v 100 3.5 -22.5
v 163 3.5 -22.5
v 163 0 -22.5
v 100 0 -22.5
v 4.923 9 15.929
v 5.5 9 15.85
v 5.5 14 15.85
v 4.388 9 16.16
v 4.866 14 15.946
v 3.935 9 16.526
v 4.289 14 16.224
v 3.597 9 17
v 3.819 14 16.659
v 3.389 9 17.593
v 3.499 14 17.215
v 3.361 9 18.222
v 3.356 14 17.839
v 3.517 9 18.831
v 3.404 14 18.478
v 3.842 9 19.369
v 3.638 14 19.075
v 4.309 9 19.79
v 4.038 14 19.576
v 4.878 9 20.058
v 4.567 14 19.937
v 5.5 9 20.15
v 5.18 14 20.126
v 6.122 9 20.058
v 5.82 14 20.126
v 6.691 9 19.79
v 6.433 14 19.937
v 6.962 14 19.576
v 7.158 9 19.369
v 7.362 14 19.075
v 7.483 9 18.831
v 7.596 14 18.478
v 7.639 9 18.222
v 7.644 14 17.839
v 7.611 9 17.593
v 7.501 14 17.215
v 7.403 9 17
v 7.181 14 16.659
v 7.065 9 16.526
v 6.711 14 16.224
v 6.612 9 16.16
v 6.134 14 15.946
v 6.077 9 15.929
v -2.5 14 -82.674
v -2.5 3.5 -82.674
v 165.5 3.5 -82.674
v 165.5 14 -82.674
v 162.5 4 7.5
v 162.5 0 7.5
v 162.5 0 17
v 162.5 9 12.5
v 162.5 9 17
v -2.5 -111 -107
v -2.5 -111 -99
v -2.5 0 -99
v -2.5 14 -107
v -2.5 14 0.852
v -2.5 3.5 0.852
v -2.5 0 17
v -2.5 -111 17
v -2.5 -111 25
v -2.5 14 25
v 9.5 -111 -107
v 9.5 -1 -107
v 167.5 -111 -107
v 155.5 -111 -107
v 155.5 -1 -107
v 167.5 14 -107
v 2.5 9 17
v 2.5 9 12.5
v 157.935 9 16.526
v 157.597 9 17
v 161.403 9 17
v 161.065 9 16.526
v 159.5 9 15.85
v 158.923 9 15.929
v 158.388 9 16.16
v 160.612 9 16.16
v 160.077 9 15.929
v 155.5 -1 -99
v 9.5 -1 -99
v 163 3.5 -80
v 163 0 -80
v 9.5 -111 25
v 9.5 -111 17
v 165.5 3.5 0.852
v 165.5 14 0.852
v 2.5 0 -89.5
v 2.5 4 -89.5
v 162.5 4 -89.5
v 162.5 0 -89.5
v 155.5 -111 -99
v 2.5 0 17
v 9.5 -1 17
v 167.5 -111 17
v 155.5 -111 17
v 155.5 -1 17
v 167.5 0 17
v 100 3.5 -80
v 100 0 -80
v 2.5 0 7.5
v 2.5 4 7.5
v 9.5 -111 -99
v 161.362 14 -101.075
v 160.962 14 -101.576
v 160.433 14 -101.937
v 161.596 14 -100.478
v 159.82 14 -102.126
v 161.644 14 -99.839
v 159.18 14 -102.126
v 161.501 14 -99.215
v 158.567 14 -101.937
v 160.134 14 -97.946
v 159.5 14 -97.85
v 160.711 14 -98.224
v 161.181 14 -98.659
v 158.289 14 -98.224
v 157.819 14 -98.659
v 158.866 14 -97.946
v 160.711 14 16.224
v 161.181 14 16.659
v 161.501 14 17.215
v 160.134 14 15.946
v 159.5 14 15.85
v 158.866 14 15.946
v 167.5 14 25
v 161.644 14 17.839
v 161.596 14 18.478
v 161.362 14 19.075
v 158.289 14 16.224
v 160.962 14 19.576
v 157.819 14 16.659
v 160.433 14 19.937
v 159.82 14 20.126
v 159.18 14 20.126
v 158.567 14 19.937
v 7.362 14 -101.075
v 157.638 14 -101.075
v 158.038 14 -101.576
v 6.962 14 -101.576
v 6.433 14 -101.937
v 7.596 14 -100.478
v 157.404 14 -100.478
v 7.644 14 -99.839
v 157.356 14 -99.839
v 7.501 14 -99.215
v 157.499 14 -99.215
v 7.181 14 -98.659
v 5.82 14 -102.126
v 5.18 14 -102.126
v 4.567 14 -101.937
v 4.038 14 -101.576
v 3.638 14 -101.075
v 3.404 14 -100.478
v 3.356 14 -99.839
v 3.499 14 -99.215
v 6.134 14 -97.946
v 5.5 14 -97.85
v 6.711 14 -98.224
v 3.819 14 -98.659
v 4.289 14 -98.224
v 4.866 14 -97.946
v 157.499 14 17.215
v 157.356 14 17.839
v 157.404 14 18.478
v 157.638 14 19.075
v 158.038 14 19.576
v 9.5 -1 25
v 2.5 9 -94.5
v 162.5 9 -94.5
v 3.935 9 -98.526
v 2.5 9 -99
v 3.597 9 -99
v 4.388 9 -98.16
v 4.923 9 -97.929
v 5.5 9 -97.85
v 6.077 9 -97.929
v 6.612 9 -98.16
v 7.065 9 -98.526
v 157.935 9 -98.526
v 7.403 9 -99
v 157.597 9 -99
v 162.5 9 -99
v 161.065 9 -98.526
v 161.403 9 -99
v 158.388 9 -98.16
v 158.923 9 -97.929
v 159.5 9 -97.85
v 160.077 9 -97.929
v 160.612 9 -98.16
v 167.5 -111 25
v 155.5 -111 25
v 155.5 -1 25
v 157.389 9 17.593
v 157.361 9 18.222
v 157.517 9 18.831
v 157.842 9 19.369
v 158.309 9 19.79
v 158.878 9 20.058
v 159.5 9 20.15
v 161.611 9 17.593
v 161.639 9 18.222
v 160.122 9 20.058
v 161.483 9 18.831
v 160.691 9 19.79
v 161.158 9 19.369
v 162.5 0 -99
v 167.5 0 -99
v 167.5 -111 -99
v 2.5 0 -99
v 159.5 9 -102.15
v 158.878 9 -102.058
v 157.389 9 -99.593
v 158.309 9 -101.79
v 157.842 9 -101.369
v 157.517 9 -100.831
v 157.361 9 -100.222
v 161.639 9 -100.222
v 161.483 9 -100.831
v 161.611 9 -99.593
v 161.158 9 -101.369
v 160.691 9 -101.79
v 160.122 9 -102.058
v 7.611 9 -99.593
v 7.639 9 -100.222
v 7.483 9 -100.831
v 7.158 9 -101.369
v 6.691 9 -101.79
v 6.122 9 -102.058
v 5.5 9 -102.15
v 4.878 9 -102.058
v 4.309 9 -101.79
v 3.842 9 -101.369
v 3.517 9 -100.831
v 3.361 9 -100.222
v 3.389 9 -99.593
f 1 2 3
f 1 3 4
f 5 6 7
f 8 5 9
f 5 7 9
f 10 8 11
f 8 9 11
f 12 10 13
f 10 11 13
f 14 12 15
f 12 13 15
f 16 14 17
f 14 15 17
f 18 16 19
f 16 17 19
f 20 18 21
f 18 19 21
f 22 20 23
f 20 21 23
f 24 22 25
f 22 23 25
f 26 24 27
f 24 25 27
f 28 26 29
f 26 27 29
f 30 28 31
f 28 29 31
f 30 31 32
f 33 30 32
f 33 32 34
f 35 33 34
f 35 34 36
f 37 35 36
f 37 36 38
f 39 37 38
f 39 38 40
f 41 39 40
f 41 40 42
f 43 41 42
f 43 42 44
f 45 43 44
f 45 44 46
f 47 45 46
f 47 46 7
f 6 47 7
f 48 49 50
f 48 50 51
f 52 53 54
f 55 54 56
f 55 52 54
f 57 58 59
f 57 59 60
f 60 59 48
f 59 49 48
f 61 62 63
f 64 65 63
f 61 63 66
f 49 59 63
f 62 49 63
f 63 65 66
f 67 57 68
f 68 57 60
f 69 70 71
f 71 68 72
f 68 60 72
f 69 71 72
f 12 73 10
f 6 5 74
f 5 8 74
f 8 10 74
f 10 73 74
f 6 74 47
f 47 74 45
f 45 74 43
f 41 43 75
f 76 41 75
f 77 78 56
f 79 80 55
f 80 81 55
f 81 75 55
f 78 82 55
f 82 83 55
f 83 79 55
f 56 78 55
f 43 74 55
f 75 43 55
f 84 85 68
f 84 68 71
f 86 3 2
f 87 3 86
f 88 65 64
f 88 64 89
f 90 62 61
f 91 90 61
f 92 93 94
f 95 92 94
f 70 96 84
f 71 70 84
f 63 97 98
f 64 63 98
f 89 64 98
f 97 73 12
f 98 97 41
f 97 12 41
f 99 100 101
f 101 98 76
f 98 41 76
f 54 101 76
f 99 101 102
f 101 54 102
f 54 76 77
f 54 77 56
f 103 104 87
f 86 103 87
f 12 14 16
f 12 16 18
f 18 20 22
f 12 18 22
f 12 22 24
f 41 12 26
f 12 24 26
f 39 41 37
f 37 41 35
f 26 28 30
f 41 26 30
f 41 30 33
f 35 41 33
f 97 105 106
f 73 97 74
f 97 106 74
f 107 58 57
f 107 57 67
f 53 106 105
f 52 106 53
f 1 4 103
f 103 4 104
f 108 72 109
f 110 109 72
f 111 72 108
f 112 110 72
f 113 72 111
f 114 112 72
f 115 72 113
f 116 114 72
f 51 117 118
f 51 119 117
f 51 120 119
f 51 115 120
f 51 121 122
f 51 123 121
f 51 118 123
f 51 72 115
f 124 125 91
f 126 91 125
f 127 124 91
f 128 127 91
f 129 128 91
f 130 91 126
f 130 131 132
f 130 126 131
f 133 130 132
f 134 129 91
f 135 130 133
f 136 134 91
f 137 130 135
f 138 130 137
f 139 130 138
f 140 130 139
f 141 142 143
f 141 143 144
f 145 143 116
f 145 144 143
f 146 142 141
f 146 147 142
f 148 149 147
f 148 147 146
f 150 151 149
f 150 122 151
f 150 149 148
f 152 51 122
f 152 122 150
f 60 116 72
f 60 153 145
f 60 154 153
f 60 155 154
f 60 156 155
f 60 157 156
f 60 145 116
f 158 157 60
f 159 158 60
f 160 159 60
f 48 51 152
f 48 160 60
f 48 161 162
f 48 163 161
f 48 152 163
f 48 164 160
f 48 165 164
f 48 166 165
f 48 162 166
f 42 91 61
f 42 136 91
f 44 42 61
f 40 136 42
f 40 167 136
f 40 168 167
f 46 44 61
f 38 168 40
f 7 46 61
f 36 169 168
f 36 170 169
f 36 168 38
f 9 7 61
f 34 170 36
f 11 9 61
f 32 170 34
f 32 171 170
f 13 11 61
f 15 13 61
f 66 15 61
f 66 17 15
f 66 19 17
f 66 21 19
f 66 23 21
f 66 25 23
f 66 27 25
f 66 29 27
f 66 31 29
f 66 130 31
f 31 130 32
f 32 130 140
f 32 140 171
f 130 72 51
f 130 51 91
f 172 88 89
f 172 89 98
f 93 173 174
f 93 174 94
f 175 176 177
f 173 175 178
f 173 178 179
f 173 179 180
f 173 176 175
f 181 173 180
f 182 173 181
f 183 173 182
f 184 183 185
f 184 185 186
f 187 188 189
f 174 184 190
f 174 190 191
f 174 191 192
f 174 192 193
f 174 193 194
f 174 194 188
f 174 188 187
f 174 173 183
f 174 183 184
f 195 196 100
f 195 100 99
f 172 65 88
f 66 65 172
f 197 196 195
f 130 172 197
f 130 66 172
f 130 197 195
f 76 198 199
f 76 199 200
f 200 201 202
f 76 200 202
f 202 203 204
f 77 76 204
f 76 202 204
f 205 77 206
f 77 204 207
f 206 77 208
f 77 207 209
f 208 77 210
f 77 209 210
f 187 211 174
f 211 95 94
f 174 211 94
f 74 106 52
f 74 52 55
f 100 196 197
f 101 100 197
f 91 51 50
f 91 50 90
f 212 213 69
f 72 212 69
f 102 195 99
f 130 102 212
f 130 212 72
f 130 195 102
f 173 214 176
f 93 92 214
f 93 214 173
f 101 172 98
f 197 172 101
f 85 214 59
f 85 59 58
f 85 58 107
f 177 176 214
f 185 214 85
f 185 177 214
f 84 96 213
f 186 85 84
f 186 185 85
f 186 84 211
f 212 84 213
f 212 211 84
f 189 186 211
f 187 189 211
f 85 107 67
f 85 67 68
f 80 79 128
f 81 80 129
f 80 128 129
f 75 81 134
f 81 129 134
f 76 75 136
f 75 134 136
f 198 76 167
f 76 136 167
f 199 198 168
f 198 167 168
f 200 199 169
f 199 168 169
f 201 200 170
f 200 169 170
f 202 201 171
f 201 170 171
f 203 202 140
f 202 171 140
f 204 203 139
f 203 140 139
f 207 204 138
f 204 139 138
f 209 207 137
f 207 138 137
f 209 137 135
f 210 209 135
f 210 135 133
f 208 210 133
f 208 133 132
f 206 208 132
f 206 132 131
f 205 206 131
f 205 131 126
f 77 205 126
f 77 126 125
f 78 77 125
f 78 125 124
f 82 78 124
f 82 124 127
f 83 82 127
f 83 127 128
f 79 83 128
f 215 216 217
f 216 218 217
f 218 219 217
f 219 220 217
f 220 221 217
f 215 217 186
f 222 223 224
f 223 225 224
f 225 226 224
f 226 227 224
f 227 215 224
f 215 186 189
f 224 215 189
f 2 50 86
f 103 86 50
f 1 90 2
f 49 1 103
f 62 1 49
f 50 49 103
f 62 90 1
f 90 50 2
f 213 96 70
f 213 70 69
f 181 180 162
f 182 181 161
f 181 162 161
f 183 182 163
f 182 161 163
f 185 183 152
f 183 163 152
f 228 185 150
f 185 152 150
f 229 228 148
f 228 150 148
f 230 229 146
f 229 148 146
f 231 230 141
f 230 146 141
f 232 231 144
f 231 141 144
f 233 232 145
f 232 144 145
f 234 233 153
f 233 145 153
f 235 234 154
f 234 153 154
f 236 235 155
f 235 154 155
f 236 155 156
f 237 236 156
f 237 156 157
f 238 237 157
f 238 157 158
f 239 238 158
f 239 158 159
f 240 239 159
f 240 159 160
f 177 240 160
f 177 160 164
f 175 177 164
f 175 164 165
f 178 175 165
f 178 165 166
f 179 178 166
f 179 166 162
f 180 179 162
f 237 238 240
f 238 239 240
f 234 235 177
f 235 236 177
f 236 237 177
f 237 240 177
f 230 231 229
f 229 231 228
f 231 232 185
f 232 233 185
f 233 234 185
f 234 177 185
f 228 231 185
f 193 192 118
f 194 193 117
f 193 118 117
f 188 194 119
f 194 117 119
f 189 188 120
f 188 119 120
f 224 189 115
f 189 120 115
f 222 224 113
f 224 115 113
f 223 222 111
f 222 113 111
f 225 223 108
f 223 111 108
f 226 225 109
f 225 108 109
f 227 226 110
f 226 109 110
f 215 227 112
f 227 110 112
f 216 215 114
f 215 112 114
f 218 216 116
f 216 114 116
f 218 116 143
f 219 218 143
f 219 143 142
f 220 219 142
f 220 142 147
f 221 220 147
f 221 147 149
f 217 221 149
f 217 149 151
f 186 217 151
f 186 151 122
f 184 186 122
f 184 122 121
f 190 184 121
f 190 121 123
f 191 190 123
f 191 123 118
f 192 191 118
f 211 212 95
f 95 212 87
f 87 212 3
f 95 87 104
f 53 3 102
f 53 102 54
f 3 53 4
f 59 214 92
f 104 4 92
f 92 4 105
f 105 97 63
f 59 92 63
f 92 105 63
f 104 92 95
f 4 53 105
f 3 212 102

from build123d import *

# Parameters (mm, degrees)
SKETCH1_9_W                                = 170
SKETCH1_9_H                                = 87
BOSS_EXTRUDE5_DEPTH                        = 2
SKETCH1_10_W                               = 63
SKETCH1_10_H                               = 78
CUT_EXTRUDE3_DEPTH                         = 9
SKETCH1_12_W                               = 170
SKETCH1_12_H                               = 87
BOSS_EXTRUDE6_DEPTH                        = 14
SKETCH1_W                                  = 63
SKETCH1_H                                  = 78
CUT_EXTRUDE4_DEPTH                         = 29
SKETCH8_W                                  = 83.526029731
SKETCH8_H                                  = 10.5
CUT_EXTRUDE5_DEPTH                         = 168
BOSS_EXTRUDE10_DEPTH                       = 22.5
CHAMFER1_SIZE                              = 10
CHAMFER2_SIZE                              = 10
SKETCH47_R                                 = 2.15
CUT_EXTRUDE10_DEPTH                        = 9.5
SKETCH37_W                                 = 170
SKETCH37_H                                 = 9
BOSS_EXTRUDE20_DEPTH                       = 5
SKETCH25_W                                 = 170
SKETCH25_H                                 = 8
BOSS_EXTRUDE18_DEPTH                       = 120
SKETCH28_W                                 = 170
SKETCH28_H                                 = 8
BOSS_EXTRUDE19_DEPTH                       = 120
SKETCH43_W                                 = 146
SKETCH43_H                                 = 110
CUT_EXTRUDE9_DEPTH                         = 170.5
SKETCH42_W                                 = 63
SKETCH42_H                                 = 3.5
BOSS_EXTRUDE22_DEPTH                       = 20.5
SKETCH38_W                                 = 5
SKETCH38_H                                 = 9
BOSS_EXTRUDE23_DEPTH                       = 9.5
MIRROR14_AT_THE_SECOND_PLANE_COPY_1_SKET_W = 5
MIRROR14_AT_THE_SECOND_PLANE_COPY_1_SKET_H = 9
MIRROR14_AT_THE_SECOND_PLANE_COPY_1_DEPTH  = 9.5


with BuildPart() as part:
    # Sketch1<9> → Boss-Extrude5 (new body)
    with BuildSketch(Plane(origin=(0, 0, 0), x_dir=(1, 0, 0), z_dir=(0, 1, 0))):
        with Locations((82.5, 41)):
            Rectangle(SKETCH1_9_W, SKETCH1_9_H)
    extrude(amount=BOSS_EXTRUDE5_DEPTH)

    # Sketch1<10> → Cut-Extrude3 (cut)
    with BuildSketch(Plane(origin=(0, 0, 0), x_dir=(1, 0, 0), z_dir=(0, 1, 0))):
        with Locations((131.5, 41)):
            Rectangle(SKETCH1_10_W, SKETCH1_10_H)
    extrude(amount=CUT_EXTRUDE3_DEPTH, mode=Mode.SUBTRACT)

    # Sketch1<12> → Boss-Extrude6 (add)
    with BuildSketch(Plane(origin=(0, 0, 0), x_dir=(1, 0, 0), z_dir=(0, 1, 0))):
        with Locations((82.5, 41)):
            Rectangle(SKETCH1_12_W, SKETCH1_12_H)
    extrude(amount=BOSS_EXTRUDE6_DEPTH)

    # Sketch1 → Cut-Extrude4 (cut)
    with BuildSketch(Plane(origin=(0, 0, 0), x_dir=(1, 0, 0), z_dir=(0, 1, 0))):
        with Locations((131.5, 41)):
            Rectangle(SKETCH1_W, SKETCH1_H)
    extrude(amount=CUT_EXTRUDE4_DEPTH, mode=Mode.SUBTRACT)

    # Sketch8 → Cut-Extrude5 (cut)
    with BuildSketch(Plane.ZY.offset(2.5)):
        with Locations((-40.910699185, 8.75)):
            Rectangle(SKETCH8_W, SKETCH8_H)
    extrude(amount=-CUT_EXTRUDE5_DEPTH, mode=Mode.SUBTRACT)

    # Sketch11 → Boss-Extrude10 (add)
    with BuildSketch(Plane.XY.offset(2.5)):
        Polygon((-2.5, 14), (90, 14), (167.5, 14), (167.5, 9), (90, 9), (-2.5, 9), align=None)
    boss_extrude10 = extrude(amount=BOSS_EXTRUDE10_DEPTH)

    # Mirror10: Boss-Extrude10 across plane
    add(boss_extrude10.mirror(Plane.XY.offset(-41)))

    # Chamfer1
    # the kernel refuses this chamfer: 10 mm, written as the material it adds along each edge
    with BuildSketch(Plane(origin=(-2.5, 9, 2.5), x_dir=(0, -0.9996219169112968, -0.02749587661058636), z_dir=(1, 0, 0))) as chamfer1_piece_1_section:
        Polygon((CHAMFER1_SIZE * 0.999621916911, -CHAMFER1_SIZE * 0.0274958766106), (-CHAMFER1_SIZE * 0.0274958766106, -CHAMFER1_SIZE * 0.999621916911), (0, 0), align=None)
    chamfer1_piece_1 = extrude(amount=170, mode=Mode.PRIVATE)
    chamfer1_piece_1 = split(chamfer1_piece_1, bisect_by=Plane(origin=(82.5, 0, 5.859007471), z_dir=(0, 1, 0)), keep=Keep.TOP, mode=Mode.PRIVATE)
    add(chamfer1_piece_1)

    # Chamfer2
    # the kernel refuses this chamfer: 10 mm, written as the material it adds along each edge
    with BuildSketch(Plane(origin=(-2.5, 9, -84.5), x_dir=(0, 0.027495876610586317, -0.9996219169112968), z_dir=(1, 0, 0))) as chamfer2_piece_1_section:
        Polygon((CHAMFER2_SIZE * 0.999621916911, -CHAMFER2_SIZE * 0.0274958766106), (-CHAMFER2_SIZE * 0.0274958766106, -CHAMFER2_SIZE * 0.999621916911), (0, 0), align=None)
    chamfer2_piece_1 = extrude(amount=170, mode=Mode.PRIVATE)
    chamfer2_piece_1 = split(chamfer2_piece_1, bisect_by=Plane(origin=(82.5, 0, -87.859007471), z_dir=(0, 1, 0)), keep=Keep.TOP, mode=Mode.PRIVATE)
    add(chamfer2_piece_1)

    # Sketch47 → Cut-Extrude10 (cut)
    with BuildSketch(Plane(origin=(0, 14, 0), x_dir=(1, 0, 0), z_dir=(0, 1, 0))):
        with Locations(Location((5.5, 100, 0), (0, 0, 270))):
            Circle(SKETCH47_R)
        with Locations(Location((159.5, 100, 0), (0, 0, 270))):
            Circle(SKETCH47_R)
        with Locations(Location((159.5, -18, 0), (0, 0, 90))):
            Circle(SKETCH47_R)
        with Locations(Location((5.5, -18, 0), (0, 0, 90))):
            Circle(SKETCH47_R)
    extrude(amount=-CUT_EXTRUDE10_DEPTH, mode=Mode.SUBTRACT)

    # Sketch37 → Boss-Extrude20 (add)
    with BuildSketch(Plane.XY.offset(2.5)):
        with Locations((82.5, 4.5)):
            Rectangle(SKETCH37_W, SKETCH37_H)
    boss_extrude20 = extrude(amount=BOSS_EXTRUDE20_DEPTH)

    # Sketch25 → Boss-Extrude18 (add)
    with BuildSketch(Plane.XZ.offset(-9)):
        with Locations((82.5, -103)):
            Rectangle(SKETCH25_W, SKETCH25_H)
    extrude(amount=BOSS_EXTRUDE18_DEPTH)

    # Sketch28 → Boss-Extrude19 (add)
    with BuildSketch(Plane.XZ.offset(-9)):
        with Locations((82.5, 21)):
            Rectangle(SKETCH28_W, SKETCH28_H)
    extrude(amount=BOSS_EXTRUDE19_DEPTH)

    # Mirror11: Boss-Extrude20 across plane
    add(boss_extrude20.mirror(Plane.XY.offset(-41)))

    # Sketch43 → Cut-Extrude9 (cut)
    with BuildSketch(Plane.XY.offset(25)):
        with Locations((82.5, -56)):
            Rectangle(SKETCH43_W, SKETCH43_H)
    extrude(amount=-CUT_EXTRUDE9_DEPTH, mode=Mode.SUBTRACT)

    # Sketch42 → Boss-Extrude22 (add)
    with BuildSketch(Plane(origin=(0, 0, -2), x_dir=(-1, 0, 0), z_dir=(0, 0, -1))):
        with Locations((-131.5, 1.75)):
            Rectangle(SKETCH42_W, SKETCH42_H)
    extrude(amount=BOSS_EXTRUDE22_DEPTH)

    # Sketch38 → Boss-Extrude23 (add)
    with BuildSketch(Plane.XY.offset(7.5)):
        with Locations((0, 4.5)):
            Rectangle(SKETCH38_W, SKETCH38_H)
    boss_extrude23 = extrude(amount=BOSS_EXTRUDE23_DEPTH)

    # Mirror14: Boss-Extrude23 across plane
    add(boss_extrude23.mirror(Plane.XY.offset(-41)))

    # Mirror14 at the second plane: Boss-Extrude23 across plane
    add(boss_extrude23.mirror(Plane.ZY.offset(-82.5)))

    # Mirror14 at the second plane copy 1 sket → Mirror14 at the second plane copy 1 (add)
    with BuildSketch(Plane(origin=(165, 0, -89.5), x_dir=(-1, 0, 0), z_dir=(0, 0, -1))):
        with Locations((0, 4.5)):
            Rectangle(MIRROR14_AT_THE_SECOND_PLANE_COPY_1_SKET_W, MIRROR14_AT_THE_SECOND_PLANE_COPY_1_SKET_H)
    extrude(amount=MIRROR14_AT_THE_SECOND_PLANE_COPY_1_DEPTH)


solid = part.part
